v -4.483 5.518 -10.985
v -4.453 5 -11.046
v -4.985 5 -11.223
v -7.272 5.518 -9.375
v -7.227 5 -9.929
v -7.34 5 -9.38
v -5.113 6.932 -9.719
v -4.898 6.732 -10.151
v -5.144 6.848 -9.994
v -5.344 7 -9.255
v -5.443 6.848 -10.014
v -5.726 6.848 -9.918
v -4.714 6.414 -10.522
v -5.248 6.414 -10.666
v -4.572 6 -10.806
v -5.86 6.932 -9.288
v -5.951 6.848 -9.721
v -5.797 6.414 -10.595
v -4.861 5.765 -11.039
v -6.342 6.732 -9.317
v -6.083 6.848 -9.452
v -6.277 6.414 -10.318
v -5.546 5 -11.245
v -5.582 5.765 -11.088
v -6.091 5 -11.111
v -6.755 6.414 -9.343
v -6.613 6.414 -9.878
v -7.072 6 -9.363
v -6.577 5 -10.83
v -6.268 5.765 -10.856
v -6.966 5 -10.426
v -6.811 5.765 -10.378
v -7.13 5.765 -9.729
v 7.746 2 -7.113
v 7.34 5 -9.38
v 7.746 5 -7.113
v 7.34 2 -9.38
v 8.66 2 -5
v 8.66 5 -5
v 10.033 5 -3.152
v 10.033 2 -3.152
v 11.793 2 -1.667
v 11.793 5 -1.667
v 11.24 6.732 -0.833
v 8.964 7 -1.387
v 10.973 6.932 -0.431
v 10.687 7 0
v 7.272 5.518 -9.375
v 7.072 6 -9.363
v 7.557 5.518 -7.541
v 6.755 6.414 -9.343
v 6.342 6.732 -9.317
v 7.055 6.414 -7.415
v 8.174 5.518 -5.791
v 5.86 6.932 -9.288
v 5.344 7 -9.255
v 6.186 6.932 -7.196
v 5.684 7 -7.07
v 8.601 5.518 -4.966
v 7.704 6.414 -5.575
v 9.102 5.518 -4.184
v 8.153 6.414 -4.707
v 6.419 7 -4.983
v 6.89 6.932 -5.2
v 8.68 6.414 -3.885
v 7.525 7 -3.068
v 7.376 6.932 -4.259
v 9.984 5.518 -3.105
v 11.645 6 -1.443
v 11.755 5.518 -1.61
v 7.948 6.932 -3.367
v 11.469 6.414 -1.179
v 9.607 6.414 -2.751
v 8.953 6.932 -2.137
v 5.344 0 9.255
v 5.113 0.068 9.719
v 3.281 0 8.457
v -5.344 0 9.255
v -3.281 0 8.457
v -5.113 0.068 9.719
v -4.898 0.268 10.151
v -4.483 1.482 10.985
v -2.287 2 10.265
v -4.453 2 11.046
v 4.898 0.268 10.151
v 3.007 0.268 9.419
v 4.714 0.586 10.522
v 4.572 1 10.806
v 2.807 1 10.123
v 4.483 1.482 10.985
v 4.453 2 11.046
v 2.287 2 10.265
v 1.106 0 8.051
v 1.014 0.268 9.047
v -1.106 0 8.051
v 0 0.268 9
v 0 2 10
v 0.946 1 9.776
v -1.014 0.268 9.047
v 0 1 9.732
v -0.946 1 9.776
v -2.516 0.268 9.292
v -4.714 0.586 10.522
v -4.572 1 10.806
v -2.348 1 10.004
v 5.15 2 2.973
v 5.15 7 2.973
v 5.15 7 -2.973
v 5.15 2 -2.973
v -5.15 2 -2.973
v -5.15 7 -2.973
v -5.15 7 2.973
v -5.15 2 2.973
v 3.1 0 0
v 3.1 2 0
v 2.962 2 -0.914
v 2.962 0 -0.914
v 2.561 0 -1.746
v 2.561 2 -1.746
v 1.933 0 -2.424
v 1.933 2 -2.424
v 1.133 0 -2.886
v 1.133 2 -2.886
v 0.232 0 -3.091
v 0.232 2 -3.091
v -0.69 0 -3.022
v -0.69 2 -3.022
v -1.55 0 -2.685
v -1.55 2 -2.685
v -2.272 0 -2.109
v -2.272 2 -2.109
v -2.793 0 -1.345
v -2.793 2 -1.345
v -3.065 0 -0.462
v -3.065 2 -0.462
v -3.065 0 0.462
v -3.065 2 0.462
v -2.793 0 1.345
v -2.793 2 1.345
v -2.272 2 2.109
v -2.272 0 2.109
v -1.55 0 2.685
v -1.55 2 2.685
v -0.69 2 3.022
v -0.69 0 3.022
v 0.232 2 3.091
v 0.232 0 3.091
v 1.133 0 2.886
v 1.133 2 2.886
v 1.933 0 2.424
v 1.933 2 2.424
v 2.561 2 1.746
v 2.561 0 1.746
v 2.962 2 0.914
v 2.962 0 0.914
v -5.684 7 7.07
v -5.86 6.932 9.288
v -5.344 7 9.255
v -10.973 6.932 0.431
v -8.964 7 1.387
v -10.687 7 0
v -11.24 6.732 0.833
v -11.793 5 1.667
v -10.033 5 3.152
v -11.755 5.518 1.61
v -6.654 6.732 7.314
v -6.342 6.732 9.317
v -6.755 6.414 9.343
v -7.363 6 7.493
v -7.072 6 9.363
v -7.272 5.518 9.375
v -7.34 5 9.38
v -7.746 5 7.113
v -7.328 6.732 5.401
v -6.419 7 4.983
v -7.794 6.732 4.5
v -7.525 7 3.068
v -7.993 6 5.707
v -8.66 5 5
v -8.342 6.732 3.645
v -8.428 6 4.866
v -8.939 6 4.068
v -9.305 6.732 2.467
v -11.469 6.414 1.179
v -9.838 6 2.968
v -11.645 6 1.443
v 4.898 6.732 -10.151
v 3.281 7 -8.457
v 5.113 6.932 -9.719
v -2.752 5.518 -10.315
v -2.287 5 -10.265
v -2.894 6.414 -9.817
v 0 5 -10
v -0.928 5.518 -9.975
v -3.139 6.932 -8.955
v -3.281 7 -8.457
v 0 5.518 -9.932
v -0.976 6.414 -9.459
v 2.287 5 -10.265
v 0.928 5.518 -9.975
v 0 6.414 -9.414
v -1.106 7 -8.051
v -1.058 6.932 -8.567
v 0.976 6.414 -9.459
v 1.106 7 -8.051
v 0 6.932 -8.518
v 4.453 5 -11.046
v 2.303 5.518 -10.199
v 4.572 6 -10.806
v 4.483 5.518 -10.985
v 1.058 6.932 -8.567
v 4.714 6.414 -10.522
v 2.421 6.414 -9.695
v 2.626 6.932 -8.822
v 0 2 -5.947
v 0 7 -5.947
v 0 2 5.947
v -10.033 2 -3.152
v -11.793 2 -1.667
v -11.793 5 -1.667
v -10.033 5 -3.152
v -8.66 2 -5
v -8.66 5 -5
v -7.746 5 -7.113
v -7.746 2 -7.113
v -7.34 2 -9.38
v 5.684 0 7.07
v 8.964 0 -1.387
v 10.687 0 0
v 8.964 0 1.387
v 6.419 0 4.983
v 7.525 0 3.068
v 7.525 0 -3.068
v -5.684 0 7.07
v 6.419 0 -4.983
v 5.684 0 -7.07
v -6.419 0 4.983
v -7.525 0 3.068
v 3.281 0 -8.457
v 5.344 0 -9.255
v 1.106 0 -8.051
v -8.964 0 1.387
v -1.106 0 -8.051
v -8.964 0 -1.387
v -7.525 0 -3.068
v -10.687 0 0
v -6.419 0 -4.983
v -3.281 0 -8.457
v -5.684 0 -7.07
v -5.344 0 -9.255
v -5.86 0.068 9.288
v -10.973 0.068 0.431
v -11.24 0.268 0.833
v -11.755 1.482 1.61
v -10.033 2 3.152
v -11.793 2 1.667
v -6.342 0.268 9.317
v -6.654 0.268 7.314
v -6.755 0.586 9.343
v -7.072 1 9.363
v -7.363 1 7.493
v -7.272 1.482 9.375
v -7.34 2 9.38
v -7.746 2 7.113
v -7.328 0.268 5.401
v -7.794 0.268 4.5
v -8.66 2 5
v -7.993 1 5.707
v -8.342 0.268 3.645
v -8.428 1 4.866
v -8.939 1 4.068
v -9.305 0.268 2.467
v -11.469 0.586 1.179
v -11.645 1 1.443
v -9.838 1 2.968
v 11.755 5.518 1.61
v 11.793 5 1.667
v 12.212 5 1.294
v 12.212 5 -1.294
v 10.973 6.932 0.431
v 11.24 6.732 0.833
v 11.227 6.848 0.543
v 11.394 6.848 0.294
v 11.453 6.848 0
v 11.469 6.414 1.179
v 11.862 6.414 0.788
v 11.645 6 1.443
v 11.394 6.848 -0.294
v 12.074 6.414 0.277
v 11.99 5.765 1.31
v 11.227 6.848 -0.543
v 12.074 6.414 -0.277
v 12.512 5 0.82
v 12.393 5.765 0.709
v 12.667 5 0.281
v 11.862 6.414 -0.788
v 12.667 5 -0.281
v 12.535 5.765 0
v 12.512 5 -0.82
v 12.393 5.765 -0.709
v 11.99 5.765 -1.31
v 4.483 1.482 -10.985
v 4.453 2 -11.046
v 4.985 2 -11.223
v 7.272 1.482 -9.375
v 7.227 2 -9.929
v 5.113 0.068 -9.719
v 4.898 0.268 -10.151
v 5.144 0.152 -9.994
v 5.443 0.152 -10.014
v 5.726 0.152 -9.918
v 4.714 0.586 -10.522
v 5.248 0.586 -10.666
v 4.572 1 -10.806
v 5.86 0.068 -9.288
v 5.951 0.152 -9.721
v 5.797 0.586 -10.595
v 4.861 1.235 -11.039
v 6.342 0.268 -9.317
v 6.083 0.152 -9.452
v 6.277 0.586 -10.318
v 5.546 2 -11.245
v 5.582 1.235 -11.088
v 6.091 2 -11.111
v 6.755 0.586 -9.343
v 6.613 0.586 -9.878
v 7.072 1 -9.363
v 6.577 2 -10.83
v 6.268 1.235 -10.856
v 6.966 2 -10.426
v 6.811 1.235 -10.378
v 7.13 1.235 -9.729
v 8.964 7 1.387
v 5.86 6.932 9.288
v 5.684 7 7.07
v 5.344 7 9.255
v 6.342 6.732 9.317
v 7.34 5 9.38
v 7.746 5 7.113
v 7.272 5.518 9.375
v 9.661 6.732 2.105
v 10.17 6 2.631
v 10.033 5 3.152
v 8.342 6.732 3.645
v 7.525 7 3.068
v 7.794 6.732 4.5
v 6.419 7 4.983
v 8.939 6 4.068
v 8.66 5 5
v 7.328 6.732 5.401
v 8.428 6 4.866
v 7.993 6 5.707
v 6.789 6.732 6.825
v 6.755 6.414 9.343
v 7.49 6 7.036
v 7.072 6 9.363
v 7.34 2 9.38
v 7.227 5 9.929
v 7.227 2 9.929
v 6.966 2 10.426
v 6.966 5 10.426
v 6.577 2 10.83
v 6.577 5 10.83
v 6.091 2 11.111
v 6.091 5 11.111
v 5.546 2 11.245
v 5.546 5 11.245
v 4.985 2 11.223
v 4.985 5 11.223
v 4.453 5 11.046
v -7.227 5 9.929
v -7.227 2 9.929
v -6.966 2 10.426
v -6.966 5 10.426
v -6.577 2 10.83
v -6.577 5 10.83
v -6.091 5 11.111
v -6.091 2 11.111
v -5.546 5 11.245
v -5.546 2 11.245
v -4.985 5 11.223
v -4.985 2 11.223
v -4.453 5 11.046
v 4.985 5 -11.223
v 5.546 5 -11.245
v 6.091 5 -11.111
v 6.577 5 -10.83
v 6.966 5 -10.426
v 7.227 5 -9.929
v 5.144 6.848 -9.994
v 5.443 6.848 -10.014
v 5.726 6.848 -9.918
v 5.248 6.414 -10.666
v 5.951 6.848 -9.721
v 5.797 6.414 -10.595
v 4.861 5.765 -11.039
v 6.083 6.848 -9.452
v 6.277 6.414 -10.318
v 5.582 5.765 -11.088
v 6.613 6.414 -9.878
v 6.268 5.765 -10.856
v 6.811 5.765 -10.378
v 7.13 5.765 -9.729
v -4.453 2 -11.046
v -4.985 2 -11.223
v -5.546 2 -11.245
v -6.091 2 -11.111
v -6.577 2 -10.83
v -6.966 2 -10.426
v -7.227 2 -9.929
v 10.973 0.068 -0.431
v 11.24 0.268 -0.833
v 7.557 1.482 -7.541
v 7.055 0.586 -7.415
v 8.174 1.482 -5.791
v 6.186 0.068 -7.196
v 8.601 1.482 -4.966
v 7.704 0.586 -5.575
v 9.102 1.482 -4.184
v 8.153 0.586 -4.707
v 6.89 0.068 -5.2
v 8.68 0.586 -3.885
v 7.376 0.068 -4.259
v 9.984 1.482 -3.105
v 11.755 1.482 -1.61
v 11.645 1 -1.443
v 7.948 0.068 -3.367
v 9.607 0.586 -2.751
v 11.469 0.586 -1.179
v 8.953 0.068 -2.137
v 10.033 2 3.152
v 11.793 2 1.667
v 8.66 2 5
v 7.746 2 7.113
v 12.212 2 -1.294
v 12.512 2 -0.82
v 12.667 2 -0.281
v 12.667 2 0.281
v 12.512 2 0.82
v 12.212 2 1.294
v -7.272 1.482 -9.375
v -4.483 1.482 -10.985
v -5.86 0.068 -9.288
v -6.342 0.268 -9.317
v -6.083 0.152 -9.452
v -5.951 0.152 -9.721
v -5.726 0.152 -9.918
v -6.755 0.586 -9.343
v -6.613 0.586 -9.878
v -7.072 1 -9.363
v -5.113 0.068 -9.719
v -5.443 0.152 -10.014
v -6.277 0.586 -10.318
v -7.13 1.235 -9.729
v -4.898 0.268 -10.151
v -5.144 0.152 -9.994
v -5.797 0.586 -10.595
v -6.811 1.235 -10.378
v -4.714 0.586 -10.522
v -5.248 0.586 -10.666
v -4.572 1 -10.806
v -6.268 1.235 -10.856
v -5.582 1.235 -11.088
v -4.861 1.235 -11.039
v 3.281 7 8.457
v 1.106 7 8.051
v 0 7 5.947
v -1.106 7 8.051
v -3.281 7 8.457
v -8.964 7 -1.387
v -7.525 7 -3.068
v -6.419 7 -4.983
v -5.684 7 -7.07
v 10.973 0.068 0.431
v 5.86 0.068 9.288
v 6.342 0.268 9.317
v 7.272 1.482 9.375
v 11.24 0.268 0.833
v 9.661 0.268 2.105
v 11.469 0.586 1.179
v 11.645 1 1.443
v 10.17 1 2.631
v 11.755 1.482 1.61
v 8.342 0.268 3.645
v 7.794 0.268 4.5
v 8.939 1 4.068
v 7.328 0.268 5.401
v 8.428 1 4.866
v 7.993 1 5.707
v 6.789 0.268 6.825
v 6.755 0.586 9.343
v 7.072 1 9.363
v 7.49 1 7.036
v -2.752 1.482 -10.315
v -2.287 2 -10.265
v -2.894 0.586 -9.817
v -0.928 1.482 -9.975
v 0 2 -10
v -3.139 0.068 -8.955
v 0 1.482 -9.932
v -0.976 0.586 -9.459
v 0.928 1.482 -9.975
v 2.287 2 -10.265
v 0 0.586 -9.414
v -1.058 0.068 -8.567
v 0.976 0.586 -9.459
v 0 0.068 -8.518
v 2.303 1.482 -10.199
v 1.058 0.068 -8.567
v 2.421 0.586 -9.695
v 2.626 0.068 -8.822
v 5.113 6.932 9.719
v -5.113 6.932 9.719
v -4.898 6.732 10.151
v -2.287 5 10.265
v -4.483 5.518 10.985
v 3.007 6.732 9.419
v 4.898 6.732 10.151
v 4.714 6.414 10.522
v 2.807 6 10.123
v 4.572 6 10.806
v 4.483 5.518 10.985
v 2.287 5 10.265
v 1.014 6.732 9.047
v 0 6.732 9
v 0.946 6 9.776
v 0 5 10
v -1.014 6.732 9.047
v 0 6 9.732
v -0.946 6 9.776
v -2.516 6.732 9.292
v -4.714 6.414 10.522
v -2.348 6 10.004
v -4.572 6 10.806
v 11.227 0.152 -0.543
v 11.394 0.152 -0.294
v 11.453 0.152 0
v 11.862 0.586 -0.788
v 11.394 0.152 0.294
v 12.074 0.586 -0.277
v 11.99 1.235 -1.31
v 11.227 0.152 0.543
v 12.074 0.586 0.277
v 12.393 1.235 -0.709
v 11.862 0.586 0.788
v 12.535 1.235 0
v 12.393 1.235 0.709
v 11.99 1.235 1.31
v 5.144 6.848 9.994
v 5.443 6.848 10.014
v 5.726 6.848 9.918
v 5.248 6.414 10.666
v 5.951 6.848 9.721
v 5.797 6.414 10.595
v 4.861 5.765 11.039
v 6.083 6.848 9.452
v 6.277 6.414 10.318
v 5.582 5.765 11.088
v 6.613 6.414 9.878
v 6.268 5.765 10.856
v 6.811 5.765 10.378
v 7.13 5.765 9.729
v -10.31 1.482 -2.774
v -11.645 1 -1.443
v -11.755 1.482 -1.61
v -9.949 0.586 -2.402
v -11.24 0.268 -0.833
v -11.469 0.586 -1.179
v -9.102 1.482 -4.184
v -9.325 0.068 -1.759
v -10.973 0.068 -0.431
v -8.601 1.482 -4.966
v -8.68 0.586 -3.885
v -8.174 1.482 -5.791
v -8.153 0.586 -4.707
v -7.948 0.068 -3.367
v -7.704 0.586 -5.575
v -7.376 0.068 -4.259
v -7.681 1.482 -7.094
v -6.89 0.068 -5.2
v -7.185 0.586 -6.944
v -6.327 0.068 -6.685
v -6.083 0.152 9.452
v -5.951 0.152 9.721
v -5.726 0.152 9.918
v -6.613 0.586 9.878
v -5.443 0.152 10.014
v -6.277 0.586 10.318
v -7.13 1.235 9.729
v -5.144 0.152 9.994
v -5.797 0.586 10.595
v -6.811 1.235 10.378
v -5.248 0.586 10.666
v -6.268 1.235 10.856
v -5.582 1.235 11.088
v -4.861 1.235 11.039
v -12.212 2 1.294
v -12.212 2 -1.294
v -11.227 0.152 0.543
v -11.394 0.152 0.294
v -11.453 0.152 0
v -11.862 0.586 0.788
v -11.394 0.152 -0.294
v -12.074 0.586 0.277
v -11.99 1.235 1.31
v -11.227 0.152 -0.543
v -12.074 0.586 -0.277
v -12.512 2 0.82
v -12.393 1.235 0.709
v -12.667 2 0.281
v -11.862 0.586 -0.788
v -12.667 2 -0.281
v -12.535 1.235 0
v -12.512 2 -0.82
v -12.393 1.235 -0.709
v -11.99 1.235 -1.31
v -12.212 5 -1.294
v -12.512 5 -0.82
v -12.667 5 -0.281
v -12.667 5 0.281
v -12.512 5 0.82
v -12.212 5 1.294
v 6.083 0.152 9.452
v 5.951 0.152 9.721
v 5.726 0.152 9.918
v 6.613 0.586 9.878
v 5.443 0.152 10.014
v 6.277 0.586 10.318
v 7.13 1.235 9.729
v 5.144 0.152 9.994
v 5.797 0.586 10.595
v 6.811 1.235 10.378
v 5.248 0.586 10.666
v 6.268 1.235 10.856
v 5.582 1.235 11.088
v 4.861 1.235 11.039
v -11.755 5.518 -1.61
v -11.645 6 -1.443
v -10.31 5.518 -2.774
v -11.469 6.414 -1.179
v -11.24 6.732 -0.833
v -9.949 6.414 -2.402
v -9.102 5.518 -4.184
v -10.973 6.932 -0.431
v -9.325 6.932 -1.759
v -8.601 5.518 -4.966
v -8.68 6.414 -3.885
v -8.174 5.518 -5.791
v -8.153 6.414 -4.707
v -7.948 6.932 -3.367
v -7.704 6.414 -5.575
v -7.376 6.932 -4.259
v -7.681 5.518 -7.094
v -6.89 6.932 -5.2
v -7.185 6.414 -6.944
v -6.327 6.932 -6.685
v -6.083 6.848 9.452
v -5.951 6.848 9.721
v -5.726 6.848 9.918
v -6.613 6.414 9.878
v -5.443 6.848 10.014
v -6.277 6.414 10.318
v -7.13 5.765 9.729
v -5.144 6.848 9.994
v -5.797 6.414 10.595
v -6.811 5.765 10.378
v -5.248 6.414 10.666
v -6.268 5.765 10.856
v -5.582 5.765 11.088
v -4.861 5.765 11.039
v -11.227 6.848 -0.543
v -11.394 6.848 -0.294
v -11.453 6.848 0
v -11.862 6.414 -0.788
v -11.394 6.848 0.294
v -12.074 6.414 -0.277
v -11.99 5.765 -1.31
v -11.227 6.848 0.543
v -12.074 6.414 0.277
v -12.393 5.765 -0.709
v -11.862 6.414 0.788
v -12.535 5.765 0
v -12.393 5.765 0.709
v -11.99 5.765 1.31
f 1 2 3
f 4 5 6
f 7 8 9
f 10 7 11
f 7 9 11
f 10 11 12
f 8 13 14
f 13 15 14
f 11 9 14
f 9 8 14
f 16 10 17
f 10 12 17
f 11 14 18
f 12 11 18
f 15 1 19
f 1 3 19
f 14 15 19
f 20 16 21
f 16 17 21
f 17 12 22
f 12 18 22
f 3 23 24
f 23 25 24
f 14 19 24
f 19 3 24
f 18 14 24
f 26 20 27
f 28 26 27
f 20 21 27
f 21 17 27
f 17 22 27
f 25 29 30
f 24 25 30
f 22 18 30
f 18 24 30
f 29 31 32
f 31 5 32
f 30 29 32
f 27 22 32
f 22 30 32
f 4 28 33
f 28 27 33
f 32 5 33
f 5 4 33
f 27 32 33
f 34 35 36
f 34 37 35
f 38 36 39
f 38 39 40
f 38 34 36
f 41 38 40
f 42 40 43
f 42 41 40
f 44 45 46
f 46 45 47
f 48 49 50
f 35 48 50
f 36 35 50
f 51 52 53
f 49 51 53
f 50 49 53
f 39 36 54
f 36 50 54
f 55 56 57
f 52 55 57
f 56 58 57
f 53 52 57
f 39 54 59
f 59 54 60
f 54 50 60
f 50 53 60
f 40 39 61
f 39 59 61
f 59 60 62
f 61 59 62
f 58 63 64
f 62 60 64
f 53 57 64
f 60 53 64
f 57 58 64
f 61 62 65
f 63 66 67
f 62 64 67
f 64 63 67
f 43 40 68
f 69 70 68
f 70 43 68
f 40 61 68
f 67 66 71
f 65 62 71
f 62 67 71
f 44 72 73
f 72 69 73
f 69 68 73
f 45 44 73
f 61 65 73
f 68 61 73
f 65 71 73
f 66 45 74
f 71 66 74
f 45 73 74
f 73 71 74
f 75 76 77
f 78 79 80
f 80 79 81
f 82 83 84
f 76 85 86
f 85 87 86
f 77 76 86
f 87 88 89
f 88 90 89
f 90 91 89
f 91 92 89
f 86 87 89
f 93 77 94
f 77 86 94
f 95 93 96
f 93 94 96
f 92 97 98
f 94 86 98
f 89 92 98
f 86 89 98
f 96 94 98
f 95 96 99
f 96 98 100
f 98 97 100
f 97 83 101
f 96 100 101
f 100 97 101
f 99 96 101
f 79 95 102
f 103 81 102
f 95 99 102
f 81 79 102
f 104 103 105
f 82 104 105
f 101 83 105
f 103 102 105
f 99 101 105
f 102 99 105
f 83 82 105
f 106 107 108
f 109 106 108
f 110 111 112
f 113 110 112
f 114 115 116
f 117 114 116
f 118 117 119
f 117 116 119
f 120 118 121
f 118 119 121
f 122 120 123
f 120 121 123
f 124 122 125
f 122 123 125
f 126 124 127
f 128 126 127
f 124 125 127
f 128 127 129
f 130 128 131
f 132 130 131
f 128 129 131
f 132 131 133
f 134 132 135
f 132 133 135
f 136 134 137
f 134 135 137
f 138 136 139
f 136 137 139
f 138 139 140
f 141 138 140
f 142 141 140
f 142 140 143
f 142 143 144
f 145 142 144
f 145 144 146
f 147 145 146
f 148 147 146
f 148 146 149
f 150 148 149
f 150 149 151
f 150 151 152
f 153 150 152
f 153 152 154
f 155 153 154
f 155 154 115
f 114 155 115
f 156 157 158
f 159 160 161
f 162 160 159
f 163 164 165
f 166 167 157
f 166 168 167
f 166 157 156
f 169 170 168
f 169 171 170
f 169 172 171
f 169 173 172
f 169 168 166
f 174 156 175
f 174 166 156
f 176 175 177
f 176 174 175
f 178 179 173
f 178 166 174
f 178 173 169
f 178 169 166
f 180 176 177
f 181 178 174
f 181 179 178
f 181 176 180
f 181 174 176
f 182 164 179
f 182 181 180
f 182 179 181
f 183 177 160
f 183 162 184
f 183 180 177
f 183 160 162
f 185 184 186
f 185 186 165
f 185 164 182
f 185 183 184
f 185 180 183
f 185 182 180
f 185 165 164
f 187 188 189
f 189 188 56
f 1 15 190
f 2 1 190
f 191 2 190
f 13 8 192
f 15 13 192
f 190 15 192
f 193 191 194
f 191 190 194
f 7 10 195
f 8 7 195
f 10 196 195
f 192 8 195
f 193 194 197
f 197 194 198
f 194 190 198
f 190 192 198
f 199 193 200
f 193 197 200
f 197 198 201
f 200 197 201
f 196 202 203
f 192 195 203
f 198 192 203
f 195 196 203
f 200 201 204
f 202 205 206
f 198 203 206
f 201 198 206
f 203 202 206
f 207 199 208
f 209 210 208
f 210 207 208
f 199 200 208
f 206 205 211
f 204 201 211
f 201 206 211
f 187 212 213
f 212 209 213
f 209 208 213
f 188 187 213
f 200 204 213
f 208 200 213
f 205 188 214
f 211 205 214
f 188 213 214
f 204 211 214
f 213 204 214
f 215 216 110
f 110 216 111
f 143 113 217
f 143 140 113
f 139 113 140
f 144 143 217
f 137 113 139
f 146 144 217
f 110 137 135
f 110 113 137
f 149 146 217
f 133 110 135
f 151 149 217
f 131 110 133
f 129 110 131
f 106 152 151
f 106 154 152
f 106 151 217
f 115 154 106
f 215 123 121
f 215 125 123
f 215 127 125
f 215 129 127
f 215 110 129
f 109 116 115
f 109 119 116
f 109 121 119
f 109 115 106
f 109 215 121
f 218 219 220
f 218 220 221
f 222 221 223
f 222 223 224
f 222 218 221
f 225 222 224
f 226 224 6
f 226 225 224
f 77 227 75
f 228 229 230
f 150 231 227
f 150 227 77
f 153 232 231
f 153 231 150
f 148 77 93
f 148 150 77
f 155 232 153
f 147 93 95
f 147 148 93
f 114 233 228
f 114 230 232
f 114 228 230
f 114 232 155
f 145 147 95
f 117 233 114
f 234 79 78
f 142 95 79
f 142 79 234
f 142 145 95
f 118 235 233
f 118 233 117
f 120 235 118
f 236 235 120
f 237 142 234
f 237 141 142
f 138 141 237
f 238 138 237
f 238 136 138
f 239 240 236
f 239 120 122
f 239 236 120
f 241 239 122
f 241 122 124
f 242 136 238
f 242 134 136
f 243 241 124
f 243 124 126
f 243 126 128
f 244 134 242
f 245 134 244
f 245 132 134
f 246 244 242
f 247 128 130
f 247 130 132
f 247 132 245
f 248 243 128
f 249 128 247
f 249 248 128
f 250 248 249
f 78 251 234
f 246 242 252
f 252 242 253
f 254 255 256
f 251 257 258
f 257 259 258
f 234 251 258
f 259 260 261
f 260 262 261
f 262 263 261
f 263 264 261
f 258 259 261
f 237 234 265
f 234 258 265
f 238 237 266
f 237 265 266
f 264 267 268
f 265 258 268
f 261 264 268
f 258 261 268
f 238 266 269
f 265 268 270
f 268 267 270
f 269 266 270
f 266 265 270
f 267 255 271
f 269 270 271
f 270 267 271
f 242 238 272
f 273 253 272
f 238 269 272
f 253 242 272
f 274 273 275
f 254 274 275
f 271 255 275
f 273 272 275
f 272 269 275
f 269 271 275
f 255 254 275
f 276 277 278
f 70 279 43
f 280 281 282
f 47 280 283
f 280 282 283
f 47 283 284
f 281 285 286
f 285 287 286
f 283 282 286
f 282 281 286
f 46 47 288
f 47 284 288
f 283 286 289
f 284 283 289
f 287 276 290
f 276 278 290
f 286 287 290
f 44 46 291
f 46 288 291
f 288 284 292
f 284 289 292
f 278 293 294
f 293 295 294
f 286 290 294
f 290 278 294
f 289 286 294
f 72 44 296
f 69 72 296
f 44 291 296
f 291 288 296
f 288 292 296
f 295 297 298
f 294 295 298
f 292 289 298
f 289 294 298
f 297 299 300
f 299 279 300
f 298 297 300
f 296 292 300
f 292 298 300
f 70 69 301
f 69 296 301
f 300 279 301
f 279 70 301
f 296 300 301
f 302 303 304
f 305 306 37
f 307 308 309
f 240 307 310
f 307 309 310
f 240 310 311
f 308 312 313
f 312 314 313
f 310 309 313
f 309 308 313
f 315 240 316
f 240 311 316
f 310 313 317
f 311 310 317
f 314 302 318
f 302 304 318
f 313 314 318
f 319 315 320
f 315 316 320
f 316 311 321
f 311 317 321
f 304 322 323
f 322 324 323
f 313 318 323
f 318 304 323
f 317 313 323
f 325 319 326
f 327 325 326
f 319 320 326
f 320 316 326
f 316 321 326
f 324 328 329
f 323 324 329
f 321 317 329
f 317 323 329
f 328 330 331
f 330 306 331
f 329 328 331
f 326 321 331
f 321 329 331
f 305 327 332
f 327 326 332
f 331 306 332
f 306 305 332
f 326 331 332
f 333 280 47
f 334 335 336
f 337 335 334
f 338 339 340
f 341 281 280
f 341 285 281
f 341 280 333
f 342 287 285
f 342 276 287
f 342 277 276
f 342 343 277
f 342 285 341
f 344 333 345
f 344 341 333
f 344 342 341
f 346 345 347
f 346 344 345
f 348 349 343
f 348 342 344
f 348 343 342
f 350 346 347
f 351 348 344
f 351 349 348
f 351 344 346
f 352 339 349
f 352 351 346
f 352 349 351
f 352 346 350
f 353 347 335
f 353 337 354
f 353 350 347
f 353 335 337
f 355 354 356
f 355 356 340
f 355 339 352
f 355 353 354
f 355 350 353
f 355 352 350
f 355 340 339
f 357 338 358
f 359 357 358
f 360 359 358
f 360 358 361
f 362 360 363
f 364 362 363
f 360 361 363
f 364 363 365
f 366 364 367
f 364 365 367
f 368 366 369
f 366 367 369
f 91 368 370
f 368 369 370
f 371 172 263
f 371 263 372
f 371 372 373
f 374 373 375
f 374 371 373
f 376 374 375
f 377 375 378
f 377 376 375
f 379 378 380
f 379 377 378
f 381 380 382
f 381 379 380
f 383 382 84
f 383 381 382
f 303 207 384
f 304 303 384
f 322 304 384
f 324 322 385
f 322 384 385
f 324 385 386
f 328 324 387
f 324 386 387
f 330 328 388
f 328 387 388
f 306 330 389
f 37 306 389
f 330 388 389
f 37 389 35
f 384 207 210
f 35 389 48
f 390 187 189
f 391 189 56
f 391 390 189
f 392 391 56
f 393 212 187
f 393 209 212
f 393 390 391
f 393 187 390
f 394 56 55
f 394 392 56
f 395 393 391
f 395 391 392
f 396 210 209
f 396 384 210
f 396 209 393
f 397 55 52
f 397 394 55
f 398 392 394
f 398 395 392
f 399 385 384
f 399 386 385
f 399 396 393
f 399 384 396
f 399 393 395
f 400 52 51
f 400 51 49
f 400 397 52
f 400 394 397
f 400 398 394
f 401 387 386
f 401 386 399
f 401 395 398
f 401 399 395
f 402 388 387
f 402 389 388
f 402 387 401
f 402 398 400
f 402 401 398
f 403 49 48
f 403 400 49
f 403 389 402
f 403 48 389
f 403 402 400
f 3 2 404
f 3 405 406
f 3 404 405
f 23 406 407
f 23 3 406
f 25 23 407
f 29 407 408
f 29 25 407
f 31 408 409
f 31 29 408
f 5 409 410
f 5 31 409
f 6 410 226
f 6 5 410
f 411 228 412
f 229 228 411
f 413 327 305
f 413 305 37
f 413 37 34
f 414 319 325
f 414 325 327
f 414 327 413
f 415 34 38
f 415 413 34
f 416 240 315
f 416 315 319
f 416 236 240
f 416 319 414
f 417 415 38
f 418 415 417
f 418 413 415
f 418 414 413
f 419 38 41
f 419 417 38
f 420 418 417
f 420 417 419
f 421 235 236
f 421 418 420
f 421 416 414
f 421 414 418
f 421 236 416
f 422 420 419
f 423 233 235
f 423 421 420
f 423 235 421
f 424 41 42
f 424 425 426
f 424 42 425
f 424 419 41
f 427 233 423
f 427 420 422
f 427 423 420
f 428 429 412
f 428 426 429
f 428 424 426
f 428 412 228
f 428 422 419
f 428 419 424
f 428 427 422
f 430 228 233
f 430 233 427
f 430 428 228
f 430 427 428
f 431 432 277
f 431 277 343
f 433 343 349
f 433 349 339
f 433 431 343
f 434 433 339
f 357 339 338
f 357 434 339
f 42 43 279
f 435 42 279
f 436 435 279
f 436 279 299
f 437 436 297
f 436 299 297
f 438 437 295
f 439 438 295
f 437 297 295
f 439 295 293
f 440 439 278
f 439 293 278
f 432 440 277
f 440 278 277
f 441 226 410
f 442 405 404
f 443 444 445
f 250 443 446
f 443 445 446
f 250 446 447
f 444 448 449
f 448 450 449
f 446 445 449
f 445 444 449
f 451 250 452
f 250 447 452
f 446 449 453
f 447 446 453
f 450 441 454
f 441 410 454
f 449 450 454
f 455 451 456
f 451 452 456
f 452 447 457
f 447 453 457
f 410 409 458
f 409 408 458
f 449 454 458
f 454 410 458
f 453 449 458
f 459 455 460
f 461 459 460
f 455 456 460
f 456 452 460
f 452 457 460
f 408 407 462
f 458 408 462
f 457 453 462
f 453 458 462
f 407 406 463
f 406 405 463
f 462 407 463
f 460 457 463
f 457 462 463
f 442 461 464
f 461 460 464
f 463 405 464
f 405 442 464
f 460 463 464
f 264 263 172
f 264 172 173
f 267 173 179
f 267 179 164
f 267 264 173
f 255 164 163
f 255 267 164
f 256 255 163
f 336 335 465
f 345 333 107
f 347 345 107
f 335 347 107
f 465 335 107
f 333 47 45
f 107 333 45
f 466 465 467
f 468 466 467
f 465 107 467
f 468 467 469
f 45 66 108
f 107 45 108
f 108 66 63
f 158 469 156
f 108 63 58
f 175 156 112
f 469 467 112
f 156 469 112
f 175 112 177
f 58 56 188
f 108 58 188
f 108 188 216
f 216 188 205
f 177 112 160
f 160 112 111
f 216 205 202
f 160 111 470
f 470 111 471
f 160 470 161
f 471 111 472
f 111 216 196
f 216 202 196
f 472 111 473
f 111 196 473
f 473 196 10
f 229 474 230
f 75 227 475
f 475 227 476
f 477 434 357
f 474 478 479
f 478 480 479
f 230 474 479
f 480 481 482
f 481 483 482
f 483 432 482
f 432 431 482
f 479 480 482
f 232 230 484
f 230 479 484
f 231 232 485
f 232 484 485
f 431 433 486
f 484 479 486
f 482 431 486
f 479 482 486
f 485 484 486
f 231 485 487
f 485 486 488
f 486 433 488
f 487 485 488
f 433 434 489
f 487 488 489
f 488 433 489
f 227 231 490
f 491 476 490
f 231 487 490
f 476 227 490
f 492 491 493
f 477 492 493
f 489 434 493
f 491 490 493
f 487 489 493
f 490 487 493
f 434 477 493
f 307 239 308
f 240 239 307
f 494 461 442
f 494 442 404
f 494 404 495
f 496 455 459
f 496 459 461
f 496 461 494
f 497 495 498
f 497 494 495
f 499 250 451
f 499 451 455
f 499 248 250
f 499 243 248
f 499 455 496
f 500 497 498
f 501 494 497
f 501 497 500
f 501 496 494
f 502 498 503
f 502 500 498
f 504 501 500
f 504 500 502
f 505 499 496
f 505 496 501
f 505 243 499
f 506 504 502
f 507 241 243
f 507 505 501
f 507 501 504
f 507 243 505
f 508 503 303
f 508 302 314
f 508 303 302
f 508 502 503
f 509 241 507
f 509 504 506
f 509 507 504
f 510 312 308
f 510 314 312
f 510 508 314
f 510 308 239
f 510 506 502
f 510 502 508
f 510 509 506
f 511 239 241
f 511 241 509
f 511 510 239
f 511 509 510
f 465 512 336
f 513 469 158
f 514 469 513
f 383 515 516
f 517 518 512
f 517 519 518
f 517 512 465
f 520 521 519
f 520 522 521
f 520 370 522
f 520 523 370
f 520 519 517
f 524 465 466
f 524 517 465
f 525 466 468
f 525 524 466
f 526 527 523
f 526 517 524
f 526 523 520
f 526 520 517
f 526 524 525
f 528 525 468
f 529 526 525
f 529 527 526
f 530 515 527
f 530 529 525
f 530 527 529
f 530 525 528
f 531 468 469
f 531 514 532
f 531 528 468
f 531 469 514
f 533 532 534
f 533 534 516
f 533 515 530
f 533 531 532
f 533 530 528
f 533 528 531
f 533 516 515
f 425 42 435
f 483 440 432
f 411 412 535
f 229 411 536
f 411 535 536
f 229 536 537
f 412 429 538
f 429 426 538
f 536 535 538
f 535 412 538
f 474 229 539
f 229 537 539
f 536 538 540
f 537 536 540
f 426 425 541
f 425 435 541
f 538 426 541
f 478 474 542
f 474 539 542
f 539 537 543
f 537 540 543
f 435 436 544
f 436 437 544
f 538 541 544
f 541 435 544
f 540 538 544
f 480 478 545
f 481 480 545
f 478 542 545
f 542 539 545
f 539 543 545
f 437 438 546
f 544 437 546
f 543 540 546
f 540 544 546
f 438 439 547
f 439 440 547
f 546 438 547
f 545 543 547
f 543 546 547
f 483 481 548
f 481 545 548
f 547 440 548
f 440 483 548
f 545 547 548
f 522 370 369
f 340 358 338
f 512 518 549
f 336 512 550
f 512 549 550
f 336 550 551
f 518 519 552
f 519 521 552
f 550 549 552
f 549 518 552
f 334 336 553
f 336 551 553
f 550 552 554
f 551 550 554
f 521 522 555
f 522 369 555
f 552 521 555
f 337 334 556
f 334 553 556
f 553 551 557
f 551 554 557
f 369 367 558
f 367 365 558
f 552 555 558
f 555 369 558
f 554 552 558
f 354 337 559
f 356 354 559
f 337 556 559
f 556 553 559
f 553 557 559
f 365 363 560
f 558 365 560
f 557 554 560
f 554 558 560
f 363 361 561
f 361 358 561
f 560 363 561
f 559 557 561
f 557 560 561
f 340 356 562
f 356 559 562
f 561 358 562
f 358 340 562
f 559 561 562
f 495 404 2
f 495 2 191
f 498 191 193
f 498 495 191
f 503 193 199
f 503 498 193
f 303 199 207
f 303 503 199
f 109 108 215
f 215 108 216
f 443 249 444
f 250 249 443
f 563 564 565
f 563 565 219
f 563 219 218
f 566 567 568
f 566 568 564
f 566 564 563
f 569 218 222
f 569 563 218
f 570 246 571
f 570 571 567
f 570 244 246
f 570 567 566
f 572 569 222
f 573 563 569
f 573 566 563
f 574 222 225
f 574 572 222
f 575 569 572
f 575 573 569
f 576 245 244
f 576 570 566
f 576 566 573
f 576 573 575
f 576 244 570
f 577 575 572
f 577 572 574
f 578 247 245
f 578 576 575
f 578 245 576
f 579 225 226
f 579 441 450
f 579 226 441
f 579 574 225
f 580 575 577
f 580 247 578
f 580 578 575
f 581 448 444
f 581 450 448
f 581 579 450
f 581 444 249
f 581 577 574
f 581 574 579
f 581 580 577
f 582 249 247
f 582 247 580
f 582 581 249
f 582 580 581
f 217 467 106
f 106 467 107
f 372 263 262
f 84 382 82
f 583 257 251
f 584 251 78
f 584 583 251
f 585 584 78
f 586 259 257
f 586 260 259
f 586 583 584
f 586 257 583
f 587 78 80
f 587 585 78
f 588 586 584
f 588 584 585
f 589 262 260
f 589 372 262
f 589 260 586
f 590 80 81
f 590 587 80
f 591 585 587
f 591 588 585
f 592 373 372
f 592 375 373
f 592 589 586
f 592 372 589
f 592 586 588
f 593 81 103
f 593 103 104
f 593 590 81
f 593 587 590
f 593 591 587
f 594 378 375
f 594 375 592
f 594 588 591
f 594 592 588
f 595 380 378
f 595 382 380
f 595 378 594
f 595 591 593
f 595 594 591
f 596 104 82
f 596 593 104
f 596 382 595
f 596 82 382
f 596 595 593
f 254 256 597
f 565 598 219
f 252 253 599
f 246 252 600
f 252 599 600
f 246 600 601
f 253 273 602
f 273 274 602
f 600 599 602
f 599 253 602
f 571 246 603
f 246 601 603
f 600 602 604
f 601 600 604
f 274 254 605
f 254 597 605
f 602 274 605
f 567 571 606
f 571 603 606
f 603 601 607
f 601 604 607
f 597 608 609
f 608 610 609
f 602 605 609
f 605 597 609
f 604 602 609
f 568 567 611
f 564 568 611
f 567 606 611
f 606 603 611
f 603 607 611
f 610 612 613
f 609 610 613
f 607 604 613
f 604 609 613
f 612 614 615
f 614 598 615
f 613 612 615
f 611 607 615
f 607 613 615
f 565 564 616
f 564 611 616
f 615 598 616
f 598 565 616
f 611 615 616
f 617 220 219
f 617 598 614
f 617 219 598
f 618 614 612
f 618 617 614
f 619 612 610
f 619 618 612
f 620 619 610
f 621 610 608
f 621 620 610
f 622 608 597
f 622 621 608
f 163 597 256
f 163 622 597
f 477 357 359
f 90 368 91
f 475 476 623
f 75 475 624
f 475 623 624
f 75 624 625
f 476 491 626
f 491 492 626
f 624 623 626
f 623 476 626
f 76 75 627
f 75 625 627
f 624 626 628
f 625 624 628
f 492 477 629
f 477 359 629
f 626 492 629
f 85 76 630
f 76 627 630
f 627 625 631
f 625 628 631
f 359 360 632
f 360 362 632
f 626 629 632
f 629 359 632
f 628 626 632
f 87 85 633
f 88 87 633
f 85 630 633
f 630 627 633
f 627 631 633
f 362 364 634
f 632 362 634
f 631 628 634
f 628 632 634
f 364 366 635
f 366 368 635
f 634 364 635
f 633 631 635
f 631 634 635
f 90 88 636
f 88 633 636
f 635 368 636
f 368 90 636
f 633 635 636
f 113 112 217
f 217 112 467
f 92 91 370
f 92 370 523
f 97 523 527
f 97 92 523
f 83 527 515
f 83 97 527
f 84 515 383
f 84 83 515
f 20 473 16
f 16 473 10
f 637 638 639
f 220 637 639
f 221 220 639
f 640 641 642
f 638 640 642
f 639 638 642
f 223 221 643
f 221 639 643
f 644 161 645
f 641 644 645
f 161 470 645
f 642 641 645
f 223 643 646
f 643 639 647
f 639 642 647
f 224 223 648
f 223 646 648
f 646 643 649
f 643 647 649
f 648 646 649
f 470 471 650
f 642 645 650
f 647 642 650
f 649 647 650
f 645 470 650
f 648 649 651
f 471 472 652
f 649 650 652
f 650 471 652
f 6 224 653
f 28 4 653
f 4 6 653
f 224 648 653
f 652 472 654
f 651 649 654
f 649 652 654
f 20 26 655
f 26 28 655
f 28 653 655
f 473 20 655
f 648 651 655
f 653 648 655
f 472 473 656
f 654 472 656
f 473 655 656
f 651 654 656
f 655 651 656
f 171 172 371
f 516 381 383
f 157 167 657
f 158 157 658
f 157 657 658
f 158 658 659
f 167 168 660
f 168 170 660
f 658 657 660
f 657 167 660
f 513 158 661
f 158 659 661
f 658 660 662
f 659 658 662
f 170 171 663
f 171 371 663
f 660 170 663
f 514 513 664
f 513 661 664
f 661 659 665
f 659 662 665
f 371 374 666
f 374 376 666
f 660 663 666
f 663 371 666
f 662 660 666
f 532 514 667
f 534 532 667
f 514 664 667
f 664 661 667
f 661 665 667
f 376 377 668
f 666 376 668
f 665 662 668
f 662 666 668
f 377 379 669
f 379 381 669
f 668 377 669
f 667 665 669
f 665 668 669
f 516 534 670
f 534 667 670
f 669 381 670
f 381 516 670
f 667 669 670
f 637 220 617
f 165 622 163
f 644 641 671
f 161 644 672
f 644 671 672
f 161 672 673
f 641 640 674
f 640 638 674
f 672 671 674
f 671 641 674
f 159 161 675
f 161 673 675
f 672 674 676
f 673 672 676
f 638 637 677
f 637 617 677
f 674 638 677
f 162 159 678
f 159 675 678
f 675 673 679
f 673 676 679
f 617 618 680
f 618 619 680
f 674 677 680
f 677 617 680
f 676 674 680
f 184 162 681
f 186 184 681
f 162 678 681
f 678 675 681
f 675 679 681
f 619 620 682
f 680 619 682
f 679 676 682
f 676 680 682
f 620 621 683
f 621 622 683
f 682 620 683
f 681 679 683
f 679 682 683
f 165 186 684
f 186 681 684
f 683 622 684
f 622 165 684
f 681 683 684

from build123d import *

# Parameters (mm, degrees)
BOSS_EXTRUDE1_DEPTH = 7
CUT_EXTRUDE1_DEPTH  = 5
SKETCH3_R           = 3.1
CUT_EXTRUDE2_DEPTH  = 3
FILLET1_R           = 2


with BuildPart() as part:
    # Sketch1 → Boss-Extrude1 (new body)
    with BuildSketch(Plane(origin=(0, 0, 0), x_dir=(1, 0, 0), z_dir=(0, 1, 0))):
        with BuildLine():
            ThreePointArc((-8.660254038, 15), (0, 10), (8.660254038, 15))
            ThreePointArc((8.660254038, 15), (8.660254038, 5), (17.320508076, 0))
            ThreePointArc((17.320508076, 0), (8.660254038, -5), (8.660254038, -15))
            ThreePointArc((8.660254038, -15), (0, -10), (-8.660254038, -15))
            ThreePointArc((-8.660254038, -15), (-8.660254038, -5), (-17.320508076, 0))
            ThreePointArc((-17.320508076, 0), (-8.660254038, 5), (-8.660254038, 15))
        make_face()
    extrude(amount=BOSS_EXTRUDE1_DEPTH)

    # Sketch2 → Cut-Extrude1 (cut)
    with BuildSketch(Plane(origin=(0, 7, 0), x_dir=(1, 0, 0), z_dir=(0, 1, 0))):
        Polygon((0, -5.946707773), (5.15, -2.973353886), (5.15, 2.973353886), (0, 5.946707773), (-5.15, 2.973353886), (-5.15, -2.973353886), align=None)
    extrude(amount=-CUT_EXTRUDE1_DEPTH, mode=Mode.SUBTRACT)

    # Sketch3 → Cut-Extrude2 (cut, through all)
    with BuildSketch(Plane(origin=(0, 2, 0), x_dir=(1, 0, 0), z_dir=(0, 1, 0))):
        Circle(SKETCH3_R)
    extrude(amount=-CUT_EXTRUDE2_DEPTH, mode=Mode.SUBTRACT)

    # Fillet1
    fillet1_edges = [part.edges().sort_by_distance(p)[0] for p in [
        (8.660254038, 7, -5),
        (-8.660254038, 3.5, 15),
        (-17.320508076, 3.5, 0),
        (-8.660254038, 3.5, -15),
        (8.660254038, 3.5, -15),
        (17.320508076, 3.5, 0),
        (8.660254038, 3.5, 15),
        (0, 7, -10),
        (-8.660254038, 7, -5),
        (-8.660254038, 7, 5),
        (0, 7, 10),
        (-8.660254038, 0, 5),
        (-8.660254038, 0, -5),
        (0, 0, -10),
        (8.660254038, 7, 5),
        (8.660254038, 0, -5),
        (8.660254038, 0, 5),
        (0, 0, 10),
    ]]
    fillet(fillet1_edges, radius=FILLET1_R)


solid = part.part
